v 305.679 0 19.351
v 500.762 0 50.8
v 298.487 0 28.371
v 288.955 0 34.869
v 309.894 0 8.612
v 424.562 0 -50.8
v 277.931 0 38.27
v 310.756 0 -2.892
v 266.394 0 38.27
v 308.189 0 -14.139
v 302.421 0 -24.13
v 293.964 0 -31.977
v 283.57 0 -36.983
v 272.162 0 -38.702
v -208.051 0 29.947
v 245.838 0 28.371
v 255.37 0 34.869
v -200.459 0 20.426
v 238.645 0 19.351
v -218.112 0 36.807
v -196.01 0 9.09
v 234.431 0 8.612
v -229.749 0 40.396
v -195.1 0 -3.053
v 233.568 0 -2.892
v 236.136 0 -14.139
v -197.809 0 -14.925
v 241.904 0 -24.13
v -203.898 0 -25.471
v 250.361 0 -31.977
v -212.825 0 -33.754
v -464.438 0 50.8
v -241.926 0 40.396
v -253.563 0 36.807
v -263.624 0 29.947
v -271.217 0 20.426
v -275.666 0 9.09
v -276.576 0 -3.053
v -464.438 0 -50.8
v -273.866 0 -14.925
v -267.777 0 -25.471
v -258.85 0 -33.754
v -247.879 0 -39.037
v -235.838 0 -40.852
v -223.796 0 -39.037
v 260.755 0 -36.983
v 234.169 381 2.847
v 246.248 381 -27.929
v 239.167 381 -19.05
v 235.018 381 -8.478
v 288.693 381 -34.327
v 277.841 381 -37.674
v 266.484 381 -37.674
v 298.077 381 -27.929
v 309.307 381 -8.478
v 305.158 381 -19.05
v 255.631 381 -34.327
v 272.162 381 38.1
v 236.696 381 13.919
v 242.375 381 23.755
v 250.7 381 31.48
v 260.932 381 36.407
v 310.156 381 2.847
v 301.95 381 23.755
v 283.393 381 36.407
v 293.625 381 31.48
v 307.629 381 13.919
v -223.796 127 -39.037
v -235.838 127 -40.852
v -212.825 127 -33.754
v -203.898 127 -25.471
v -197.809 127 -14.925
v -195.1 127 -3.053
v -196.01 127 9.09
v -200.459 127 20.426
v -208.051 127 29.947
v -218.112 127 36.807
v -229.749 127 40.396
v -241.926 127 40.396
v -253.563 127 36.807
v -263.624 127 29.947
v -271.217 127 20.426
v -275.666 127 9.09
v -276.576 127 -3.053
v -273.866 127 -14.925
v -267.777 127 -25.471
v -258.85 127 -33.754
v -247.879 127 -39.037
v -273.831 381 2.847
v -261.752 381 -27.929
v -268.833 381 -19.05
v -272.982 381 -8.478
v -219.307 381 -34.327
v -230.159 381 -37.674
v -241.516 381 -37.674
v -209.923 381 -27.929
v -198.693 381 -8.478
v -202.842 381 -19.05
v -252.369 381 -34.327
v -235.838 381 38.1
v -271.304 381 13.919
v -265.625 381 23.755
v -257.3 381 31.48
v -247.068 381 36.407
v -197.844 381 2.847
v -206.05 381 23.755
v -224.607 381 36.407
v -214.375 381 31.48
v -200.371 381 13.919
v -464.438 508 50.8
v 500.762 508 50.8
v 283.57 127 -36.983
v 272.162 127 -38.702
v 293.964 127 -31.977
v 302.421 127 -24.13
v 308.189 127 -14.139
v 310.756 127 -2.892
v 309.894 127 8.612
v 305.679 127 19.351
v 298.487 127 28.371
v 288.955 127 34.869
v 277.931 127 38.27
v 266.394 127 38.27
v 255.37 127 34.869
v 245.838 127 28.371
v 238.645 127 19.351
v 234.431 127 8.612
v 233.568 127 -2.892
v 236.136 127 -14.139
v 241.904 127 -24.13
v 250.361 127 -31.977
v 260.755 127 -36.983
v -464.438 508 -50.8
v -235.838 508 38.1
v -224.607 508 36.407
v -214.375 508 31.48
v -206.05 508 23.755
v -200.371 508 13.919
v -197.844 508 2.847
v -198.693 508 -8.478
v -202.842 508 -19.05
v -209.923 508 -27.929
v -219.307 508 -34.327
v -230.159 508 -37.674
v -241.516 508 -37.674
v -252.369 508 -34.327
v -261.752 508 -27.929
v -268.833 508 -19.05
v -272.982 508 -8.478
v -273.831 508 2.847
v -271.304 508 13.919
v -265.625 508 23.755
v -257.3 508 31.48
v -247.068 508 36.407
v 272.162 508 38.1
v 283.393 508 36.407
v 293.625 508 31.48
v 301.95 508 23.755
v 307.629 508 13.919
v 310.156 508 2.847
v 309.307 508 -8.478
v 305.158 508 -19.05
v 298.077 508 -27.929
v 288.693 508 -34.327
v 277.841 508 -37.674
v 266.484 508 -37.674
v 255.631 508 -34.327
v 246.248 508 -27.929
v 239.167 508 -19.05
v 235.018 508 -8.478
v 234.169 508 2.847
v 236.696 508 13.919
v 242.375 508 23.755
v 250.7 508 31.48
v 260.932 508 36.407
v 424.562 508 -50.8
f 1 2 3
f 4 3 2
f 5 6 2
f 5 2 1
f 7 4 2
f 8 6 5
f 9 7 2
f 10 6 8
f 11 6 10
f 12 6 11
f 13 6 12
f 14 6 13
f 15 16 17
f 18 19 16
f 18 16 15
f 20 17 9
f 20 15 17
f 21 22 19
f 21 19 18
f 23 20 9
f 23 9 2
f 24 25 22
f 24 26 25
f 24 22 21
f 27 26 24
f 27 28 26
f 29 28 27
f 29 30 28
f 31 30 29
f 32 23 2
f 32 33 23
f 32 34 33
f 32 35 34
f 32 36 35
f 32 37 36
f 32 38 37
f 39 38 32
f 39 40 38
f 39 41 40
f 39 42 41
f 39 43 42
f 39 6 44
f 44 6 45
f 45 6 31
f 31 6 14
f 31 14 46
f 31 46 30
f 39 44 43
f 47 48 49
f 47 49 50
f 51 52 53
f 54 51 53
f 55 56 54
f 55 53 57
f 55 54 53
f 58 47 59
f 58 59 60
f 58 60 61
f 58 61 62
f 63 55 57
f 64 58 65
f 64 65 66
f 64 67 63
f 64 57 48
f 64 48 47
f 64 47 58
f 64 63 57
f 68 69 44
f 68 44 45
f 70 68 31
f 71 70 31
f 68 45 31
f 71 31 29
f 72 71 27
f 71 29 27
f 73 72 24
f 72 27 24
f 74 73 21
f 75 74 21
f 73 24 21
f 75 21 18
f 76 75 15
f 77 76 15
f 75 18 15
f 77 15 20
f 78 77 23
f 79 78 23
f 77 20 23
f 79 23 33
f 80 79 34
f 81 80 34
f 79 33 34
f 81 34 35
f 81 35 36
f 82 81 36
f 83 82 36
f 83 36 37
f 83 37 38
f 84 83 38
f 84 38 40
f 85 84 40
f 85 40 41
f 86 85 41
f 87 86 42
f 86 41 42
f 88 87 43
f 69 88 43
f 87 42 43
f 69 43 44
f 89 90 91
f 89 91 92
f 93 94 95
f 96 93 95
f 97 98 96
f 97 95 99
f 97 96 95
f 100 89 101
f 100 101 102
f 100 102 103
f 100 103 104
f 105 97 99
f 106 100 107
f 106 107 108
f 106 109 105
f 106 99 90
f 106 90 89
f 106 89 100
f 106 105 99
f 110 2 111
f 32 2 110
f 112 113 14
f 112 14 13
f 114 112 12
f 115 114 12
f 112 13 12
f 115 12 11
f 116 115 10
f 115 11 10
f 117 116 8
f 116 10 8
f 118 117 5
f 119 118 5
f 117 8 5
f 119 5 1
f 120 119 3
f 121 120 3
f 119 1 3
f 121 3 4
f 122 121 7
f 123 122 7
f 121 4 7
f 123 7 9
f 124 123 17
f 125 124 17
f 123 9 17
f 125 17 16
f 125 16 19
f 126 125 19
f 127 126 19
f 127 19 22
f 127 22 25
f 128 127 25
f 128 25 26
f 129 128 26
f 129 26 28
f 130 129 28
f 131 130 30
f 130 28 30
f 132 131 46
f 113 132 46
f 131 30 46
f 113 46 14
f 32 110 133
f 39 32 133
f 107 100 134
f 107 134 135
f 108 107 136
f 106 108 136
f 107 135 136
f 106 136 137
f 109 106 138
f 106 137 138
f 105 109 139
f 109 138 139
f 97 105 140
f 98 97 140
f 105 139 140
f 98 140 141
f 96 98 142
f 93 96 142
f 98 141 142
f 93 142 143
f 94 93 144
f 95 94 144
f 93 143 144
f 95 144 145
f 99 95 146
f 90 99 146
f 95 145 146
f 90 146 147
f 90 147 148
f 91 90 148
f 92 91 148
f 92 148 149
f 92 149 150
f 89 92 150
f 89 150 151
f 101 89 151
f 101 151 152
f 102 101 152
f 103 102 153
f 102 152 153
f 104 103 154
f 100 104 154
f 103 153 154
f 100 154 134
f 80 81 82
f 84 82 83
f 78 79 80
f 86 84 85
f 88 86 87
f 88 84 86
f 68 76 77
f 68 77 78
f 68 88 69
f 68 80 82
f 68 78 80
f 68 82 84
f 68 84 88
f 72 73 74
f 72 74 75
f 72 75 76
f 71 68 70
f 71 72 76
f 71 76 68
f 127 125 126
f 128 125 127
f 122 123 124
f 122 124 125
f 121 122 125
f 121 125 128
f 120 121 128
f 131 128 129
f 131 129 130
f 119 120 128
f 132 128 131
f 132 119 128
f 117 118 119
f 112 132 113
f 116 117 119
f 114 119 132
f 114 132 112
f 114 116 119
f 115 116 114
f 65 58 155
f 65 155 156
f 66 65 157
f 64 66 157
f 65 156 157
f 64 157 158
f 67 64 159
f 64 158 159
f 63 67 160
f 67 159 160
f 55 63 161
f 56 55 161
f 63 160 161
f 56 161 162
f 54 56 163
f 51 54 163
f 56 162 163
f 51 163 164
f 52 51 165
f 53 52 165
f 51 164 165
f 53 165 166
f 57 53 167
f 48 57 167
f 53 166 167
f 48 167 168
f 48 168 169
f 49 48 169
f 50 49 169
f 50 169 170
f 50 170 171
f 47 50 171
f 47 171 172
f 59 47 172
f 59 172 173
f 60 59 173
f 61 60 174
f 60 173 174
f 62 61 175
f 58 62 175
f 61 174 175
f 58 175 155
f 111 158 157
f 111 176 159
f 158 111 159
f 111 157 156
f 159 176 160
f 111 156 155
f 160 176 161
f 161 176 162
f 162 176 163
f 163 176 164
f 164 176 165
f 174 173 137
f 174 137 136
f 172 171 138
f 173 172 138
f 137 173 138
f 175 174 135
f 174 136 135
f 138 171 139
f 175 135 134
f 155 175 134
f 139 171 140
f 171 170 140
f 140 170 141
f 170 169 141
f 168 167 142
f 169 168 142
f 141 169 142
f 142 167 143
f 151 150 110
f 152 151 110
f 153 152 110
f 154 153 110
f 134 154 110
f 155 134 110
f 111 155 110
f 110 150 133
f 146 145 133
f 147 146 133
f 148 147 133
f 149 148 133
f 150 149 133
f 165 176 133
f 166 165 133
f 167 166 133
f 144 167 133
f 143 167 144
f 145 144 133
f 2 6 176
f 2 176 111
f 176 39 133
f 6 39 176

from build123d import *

# Parameters (mm, degrees)
BOSS_EXTRUDE2_DEPTH = 508
SKETCH5_R           = 38.1
CUT_EXTRUDE1_DEPTH  = 127
SKETCH7_R           = 40.852227979
SKETCH7_R_2         = 38.702110717
CUT_EXTRUDE2_DEPTH  = 127


with BuildPart() as part:
    # Sketch1 → Boss-Extrude2 (new body)
    with BuildSketch(Plane(origin=(0, 0, 0), x_dir=(1, 0, 0), z_dir=(0, 1, 0))):
        Polygon((-464.437614836, 50.8), (424.562385164, 50.8), (500.762385164, -50.8), (-464.437614836, -50.8), align=None)
    extrude(amount=BOSS_EXTRUDE2_DEPTH)

    # Sketch5 → Cut-Extrude1 (cut)
    with BuildSketch(Plane(origin=(0, 508, 0), x_dir=(1, 0, 0), z_dir=(0, 1, 0))):
        with Locations(Location((-235.837614836, 0, 0), (0, 0, 270))):
            Circle(SKETCH5_R)
        with Locations(Location((272.162385164, 0, 0), (0, 0, 270))):
            Circle(SKETCH5_R)
    extrude(amount=-CUT_EXTRUDE1_DEPTH, mode=Mode.SUBTRACT)

    # Sketch7 → Cut-Extrude2 (cut)
    with BuildSketch(Plane.XZ):
        with Locations(Location((-235.837614836, 0, 0), (0, 0, 270))):
            Circle(SKETCH7_R)
        with Locations(Location((272.162385164, 0, 0), (0, 0, 270))):
            Circle(SKETCH7_R_2)
    extrude(amount=-CUT_EXTRUDE2_DEPTH, mode=Mode.SUBTRACT)


solid = part.part
